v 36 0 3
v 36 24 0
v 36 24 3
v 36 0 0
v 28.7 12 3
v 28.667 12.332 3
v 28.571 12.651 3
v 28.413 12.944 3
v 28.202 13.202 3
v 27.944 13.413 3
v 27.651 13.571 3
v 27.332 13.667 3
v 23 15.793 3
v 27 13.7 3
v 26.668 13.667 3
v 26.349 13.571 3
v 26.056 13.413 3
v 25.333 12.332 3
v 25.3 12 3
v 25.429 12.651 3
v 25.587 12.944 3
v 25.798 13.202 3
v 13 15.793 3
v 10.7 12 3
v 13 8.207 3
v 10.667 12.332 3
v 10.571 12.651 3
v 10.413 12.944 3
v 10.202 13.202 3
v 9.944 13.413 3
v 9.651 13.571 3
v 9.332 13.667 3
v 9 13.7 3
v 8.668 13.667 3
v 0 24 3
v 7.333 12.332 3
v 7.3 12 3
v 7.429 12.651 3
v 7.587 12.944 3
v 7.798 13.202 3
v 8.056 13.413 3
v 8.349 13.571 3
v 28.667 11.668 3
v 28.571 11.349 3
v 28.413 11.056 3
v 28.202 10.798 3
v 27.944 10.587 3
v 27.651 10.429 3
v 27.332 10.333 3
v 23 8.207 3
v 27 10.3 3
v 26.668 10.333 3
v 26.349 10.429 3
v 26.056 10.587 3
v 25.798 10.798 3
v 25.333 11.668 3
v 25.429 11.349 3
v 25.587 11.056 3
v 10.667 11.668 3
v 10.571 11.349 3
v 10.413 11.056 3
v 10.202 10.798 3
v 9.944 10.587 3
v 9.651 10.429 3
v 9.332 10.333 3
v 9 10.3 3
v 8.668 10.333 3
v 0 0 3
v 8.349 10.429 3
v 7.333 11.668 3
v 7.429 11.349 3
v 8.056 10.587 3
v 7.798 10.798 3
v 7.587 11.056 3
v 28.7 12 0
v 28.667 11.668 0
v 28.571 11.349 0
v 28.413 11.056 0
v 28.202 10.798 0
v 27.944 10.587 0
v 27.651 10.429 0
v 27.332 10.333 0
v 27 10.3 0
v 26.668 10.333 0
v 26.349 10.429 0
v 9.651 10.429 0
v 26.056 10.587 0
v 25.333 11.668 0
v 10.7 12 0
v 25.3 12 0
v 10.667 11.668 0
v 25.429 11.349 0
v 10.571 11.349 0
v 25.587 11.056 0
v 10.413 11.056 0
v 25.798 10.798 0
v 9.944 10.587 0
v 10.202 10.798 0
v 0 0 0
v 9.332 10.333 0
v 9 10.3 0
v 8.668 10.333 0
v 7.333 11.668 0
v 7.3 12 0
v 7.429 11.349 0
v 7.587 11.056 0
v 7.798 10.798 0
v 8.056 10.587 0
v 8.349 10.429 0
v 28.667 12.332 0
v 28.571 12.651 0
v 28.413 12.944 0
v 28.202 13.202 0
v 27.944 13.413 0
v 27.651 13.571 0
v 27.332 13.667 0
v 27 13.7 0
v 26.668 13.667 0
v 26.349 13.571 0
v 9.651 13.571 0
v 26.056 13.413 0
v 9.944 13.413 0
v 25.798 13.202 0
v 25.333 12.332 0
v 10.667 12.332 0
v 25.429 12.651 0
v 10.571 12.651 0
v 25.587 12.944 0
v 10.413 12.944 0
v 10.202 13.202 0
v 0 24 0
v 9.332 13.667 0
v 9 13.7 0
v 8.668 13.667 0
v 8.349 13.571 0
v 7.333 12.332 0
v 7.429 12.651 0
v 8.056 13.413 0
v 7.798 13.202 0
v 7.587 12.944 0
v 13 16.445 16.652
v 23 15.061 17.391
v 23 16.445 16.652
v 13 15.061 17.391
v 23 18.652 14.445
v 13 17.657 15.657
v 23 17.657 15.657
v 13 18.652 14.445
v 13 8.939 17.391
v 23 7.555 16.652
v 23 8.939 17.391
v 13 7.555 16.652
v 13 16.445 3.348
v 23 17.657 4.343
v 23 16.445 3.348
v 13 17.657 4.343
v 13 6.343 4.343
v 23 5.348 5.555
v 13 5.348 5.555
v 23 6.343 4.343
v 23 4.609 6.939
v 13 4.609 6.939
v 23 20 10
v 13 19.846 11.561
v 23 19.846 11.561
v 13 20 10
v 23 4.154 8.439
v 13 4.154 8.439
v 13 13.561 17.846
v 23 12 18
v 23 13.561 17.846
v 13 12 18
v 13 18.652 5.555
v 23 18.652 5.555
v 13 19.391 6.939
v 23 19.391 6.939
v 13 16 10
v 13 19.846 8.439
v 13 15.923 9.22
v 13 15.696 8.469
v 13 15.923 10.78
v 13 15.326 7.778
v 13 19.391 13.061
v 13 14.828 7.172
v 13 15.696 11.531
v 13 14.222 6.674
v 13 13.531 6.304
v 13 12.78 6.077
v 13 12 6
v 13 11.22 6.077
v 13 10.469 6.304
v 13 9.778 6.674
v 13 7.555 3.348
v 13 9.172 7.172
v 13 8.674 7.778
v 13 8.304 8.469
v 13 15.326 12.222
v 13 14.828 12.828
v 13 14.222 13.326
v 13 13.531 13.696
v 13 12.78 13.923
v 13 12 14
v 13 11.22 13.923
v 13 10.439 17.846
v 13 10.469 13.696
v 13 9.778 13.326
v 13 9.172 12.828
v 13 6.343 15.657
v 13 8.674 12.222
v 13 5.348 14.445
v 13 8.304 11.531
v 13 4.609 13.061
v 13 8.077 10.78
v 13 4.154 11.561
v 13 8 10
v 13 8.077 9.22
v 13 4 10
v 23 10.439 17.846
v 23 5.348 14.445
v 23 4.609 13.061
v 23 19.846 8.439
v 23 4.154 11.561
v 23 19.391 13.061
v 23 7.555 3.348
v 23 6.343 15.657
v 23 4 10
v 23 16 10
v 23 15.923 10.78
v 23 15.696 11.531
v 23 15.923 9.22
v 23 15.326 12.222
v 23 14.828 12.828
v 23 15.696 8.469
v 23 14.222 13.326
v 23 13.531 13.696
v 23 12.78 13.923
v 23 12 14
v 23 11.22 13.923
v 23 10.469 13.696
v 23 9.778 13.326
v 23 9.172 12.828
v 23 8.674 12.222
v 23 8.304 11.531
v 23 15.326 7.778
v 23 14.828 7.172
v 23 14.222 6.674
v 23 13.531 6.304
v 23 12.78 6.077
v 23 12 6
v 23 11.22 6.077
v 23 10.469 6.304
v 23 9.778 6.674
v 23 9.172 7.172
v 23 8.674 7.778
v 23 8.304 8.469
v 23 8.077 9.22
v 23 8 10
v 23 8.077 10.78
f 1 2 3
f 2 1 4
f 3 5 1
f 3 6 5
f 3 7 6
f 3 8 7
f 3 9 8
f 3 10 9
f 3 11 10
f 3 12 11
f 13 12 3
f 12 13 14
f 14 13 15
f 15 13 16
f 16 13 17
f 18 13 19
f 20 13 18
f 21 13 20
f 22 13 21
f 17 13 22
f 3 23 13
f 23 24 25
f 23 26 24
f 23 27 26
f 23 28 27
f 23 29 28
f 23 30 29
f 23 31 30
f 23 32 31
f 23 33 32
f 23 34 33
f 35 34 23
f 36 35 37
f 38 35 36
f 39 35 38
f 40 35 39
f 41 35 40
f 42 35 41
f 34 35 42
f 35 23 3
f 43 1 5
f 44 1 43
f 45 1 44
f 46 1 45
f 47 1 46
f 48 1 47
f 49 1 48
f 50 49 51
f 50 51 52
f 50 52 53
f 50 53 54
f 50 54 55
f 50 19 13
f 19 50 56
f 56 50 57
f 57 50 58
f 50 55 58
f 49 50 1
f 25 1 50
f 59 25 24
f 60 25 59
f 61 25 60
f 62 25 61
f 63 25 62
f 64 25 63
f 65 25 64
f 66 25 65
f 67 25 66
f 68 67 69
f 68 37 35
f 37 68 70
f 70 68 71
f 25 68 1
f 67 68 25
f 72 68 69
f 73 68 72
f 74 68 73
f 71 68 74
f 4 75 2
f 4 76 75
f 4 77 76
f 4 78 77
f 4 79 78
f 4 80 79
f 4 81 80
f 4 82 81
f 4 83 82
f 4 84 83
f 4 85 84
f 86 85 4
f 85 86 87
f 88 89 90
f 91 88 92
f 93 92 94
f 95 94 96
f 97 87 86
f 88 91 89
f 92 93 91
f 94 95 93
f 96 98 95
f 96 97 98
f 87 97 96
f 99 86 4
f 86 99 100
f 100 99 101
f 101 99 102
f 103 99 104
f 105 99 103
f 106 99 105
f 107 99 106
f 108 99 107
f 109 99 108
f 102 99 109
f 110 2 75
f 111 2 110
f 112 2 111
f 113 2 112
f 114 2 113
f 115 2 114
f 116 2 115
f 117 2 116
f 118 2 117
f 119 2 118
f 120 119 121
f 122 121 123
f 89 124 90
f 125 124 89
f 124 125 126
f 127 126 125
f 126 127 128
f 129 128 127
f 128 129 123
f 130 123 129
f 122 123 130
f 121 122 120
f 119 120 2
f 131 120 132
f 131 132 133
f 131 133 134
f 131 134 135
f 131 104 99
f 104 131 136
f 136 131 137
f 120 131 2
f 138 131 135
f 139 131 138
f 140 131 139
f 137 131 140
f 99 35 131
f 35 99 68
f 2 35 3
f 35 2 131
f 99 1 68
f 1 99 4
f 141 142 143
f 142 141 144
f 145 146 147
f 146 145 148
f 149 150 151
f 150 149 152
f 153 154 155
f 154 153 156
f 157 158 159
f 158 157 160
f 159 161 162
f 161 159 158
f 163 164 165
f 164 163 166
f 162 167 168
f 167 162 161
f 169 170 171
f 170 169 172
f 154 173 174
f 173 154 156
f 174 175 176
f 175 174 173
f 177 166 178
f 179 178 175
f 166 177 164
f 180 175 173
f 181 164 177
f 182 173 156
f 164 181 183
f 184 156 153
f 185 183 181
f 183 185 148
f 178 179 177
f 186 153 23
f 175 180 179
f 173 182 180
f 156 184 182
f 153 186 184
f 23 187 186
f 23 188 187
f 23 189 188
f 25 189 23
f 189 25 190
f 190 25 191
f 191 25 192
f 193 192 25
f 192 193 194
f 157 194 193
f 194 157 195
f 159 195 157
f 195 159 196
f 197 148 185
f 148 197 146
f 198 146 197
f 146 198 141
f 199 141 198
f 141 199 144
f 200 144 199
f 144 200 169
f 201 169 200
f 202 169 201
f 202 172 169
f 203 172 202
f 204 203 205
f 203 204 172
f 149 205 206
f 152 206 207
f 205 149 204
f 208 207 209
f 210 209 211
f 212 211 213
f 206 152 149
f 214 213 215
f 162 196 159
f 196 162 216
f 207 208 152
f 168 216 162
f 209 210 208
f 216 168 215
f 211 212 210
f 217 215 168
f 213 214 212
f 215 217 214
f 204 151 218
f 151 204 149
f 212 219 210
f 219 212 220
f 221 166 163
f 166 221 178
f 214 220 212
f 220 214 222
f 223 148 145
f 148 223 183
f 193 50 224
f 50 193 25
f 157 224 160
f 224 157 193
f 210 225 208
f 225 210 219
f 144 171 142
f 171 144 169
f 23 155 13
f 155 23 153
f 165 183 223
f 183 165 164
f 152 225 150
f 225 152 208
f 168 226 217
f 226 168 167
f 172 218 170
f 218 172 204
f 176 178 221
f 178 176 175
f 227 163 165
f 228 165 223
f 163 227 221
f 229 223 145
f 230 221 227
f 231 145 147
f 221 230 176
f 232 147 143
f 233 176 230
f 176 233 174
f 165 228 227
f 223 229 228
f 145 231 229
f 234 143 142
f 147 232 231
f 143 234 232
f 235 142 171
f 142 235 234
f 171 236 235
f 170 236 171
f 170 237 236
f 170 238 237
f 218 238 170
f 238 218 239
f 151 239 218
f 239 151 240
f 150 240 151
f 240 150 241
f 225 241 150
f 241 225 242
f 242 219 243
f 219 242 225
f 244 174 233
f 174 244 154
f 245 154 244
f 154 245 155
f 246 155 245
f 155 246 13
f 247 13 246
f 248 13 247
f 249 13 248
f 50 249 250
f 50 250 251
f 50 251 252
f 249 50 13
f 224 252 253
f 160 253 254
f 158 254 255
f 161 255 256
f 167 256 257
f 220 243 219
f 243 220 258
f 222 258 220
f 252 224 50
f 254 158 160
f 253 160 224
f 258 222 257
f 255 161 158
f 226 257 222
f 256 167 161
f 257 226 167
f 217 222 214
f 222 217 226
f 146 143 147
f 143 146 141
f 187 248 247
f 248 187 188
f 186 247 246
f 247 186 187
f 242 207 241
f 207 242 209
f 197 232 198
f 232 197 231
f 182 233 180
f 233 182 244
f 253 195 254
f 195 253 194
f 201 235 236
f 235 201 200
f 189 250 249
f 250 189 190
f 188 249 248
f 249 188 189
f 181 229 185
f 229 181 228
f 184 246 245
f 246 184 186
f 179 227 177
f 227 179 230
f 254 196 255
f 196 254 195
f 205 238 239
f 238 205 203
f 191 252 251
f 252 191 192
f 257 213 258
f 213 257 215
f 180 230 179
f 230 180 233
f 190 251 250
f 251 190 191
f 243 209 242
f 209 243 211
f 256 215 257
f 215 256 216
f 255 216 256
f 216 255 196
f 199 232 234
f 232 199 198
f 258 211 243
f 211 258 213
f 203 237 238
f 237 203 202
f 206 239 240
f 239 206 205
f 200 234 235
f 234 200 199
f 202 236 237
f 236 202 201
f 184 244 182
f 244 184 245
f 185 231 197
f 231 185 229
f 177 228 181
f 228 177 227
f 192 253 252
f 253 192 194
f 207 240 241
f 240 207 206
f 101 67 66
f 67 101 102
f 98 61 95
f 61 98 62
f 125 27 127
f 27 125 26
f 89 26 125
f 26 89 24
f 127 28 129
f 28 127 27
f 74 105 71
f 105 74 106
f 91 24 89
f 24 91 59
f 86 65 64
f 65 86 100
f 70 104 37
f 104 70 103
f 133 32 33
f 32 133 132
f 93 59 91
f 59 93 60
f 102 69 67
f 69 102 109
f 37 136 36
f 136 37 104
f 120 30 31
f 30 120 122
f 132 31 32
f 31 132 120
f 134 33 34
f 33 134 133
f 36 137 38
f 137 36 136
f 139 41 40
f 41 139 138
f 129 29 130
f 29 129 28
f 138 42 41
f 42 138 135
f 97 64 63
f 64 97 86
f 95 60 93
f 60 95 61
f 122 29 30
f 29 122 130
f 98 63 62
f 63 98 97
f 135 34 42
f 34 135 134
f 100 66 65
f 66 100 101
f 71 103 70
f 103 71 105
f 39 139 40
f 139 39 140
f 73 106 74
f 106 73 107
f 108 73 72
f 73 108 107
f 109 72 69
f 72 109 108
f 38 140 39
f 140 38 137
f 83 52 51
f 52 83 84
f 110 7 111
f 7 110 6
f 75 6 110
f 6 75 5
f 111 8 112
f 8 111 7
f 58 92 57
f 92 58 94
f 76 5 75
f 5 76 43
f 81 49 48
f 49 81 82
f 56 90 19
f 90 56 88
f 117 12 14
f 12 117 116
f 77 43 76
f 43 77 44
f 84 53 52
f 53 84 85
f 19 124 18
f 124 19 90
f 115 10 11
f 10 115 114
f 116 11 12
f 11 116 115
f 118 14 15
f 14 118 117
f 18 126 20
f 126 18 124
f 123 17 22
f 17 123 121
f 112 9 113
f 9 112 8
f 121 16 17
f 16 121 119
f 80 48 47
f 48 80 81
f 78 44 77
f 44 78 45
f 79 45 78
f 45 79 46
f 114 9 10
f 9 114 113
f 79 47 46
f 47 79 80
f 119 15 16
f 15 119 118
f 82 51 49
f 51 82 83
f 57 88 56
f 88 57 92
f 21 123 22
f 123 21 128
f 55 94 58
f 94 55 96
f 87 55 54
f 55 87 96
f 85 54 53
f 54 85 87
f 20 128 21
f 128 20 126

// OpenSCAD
$fn = 32;

// ----------------------------------------------------------------------
// Cable clip: cable 8 mm, clamp 16 mm, base 36 mm
// ----------------------------------------------------------------------

// --- parameters (mm) ---
foot_w = 36;              // base length, X
foot_d = 24;              // base width, Y
foot_t = 3;               // base thickness
hose_seat_d = 16;         // clamp outside diameter
ring_t = 4;               // clamp wall
cable_d = 8;              // cable opening
ring_w = 10;              // clamp width along the cable
screw_d = 3.4;            // screw clearance
sink = 1;                 // overlap of the clamp into the base

module base() {
  cube([foot_w, foot_d, foot_t]);
}

module clamp() {
  translate([foot_w / 2, foot_d / 2, foot_t + hose_seat_d / 2 - sink]) rotate([0, 90, 0])
    cylinder(h = ring_w, d = hose_seat_d, center = true);
}

difference() {
  union() {
    base();
    clamp();
  }
  translate([foot_w / 2, foot_d / 2, foot_t + hose_seat_d / 2 - sink]) rotate([0, 90, 0]) translate([0, 0, -ring_w / 2 - 1]) cylinder(h = ring_w + 2, d = cable_d);
  translate([9, foot_d / 2, -1]) cylinder(h = foot_t + 2, d = screw_d);
  translate([27, foot_d / 2, -1]) cylinder(h = foot_t + 2, d = screw_d);
}
